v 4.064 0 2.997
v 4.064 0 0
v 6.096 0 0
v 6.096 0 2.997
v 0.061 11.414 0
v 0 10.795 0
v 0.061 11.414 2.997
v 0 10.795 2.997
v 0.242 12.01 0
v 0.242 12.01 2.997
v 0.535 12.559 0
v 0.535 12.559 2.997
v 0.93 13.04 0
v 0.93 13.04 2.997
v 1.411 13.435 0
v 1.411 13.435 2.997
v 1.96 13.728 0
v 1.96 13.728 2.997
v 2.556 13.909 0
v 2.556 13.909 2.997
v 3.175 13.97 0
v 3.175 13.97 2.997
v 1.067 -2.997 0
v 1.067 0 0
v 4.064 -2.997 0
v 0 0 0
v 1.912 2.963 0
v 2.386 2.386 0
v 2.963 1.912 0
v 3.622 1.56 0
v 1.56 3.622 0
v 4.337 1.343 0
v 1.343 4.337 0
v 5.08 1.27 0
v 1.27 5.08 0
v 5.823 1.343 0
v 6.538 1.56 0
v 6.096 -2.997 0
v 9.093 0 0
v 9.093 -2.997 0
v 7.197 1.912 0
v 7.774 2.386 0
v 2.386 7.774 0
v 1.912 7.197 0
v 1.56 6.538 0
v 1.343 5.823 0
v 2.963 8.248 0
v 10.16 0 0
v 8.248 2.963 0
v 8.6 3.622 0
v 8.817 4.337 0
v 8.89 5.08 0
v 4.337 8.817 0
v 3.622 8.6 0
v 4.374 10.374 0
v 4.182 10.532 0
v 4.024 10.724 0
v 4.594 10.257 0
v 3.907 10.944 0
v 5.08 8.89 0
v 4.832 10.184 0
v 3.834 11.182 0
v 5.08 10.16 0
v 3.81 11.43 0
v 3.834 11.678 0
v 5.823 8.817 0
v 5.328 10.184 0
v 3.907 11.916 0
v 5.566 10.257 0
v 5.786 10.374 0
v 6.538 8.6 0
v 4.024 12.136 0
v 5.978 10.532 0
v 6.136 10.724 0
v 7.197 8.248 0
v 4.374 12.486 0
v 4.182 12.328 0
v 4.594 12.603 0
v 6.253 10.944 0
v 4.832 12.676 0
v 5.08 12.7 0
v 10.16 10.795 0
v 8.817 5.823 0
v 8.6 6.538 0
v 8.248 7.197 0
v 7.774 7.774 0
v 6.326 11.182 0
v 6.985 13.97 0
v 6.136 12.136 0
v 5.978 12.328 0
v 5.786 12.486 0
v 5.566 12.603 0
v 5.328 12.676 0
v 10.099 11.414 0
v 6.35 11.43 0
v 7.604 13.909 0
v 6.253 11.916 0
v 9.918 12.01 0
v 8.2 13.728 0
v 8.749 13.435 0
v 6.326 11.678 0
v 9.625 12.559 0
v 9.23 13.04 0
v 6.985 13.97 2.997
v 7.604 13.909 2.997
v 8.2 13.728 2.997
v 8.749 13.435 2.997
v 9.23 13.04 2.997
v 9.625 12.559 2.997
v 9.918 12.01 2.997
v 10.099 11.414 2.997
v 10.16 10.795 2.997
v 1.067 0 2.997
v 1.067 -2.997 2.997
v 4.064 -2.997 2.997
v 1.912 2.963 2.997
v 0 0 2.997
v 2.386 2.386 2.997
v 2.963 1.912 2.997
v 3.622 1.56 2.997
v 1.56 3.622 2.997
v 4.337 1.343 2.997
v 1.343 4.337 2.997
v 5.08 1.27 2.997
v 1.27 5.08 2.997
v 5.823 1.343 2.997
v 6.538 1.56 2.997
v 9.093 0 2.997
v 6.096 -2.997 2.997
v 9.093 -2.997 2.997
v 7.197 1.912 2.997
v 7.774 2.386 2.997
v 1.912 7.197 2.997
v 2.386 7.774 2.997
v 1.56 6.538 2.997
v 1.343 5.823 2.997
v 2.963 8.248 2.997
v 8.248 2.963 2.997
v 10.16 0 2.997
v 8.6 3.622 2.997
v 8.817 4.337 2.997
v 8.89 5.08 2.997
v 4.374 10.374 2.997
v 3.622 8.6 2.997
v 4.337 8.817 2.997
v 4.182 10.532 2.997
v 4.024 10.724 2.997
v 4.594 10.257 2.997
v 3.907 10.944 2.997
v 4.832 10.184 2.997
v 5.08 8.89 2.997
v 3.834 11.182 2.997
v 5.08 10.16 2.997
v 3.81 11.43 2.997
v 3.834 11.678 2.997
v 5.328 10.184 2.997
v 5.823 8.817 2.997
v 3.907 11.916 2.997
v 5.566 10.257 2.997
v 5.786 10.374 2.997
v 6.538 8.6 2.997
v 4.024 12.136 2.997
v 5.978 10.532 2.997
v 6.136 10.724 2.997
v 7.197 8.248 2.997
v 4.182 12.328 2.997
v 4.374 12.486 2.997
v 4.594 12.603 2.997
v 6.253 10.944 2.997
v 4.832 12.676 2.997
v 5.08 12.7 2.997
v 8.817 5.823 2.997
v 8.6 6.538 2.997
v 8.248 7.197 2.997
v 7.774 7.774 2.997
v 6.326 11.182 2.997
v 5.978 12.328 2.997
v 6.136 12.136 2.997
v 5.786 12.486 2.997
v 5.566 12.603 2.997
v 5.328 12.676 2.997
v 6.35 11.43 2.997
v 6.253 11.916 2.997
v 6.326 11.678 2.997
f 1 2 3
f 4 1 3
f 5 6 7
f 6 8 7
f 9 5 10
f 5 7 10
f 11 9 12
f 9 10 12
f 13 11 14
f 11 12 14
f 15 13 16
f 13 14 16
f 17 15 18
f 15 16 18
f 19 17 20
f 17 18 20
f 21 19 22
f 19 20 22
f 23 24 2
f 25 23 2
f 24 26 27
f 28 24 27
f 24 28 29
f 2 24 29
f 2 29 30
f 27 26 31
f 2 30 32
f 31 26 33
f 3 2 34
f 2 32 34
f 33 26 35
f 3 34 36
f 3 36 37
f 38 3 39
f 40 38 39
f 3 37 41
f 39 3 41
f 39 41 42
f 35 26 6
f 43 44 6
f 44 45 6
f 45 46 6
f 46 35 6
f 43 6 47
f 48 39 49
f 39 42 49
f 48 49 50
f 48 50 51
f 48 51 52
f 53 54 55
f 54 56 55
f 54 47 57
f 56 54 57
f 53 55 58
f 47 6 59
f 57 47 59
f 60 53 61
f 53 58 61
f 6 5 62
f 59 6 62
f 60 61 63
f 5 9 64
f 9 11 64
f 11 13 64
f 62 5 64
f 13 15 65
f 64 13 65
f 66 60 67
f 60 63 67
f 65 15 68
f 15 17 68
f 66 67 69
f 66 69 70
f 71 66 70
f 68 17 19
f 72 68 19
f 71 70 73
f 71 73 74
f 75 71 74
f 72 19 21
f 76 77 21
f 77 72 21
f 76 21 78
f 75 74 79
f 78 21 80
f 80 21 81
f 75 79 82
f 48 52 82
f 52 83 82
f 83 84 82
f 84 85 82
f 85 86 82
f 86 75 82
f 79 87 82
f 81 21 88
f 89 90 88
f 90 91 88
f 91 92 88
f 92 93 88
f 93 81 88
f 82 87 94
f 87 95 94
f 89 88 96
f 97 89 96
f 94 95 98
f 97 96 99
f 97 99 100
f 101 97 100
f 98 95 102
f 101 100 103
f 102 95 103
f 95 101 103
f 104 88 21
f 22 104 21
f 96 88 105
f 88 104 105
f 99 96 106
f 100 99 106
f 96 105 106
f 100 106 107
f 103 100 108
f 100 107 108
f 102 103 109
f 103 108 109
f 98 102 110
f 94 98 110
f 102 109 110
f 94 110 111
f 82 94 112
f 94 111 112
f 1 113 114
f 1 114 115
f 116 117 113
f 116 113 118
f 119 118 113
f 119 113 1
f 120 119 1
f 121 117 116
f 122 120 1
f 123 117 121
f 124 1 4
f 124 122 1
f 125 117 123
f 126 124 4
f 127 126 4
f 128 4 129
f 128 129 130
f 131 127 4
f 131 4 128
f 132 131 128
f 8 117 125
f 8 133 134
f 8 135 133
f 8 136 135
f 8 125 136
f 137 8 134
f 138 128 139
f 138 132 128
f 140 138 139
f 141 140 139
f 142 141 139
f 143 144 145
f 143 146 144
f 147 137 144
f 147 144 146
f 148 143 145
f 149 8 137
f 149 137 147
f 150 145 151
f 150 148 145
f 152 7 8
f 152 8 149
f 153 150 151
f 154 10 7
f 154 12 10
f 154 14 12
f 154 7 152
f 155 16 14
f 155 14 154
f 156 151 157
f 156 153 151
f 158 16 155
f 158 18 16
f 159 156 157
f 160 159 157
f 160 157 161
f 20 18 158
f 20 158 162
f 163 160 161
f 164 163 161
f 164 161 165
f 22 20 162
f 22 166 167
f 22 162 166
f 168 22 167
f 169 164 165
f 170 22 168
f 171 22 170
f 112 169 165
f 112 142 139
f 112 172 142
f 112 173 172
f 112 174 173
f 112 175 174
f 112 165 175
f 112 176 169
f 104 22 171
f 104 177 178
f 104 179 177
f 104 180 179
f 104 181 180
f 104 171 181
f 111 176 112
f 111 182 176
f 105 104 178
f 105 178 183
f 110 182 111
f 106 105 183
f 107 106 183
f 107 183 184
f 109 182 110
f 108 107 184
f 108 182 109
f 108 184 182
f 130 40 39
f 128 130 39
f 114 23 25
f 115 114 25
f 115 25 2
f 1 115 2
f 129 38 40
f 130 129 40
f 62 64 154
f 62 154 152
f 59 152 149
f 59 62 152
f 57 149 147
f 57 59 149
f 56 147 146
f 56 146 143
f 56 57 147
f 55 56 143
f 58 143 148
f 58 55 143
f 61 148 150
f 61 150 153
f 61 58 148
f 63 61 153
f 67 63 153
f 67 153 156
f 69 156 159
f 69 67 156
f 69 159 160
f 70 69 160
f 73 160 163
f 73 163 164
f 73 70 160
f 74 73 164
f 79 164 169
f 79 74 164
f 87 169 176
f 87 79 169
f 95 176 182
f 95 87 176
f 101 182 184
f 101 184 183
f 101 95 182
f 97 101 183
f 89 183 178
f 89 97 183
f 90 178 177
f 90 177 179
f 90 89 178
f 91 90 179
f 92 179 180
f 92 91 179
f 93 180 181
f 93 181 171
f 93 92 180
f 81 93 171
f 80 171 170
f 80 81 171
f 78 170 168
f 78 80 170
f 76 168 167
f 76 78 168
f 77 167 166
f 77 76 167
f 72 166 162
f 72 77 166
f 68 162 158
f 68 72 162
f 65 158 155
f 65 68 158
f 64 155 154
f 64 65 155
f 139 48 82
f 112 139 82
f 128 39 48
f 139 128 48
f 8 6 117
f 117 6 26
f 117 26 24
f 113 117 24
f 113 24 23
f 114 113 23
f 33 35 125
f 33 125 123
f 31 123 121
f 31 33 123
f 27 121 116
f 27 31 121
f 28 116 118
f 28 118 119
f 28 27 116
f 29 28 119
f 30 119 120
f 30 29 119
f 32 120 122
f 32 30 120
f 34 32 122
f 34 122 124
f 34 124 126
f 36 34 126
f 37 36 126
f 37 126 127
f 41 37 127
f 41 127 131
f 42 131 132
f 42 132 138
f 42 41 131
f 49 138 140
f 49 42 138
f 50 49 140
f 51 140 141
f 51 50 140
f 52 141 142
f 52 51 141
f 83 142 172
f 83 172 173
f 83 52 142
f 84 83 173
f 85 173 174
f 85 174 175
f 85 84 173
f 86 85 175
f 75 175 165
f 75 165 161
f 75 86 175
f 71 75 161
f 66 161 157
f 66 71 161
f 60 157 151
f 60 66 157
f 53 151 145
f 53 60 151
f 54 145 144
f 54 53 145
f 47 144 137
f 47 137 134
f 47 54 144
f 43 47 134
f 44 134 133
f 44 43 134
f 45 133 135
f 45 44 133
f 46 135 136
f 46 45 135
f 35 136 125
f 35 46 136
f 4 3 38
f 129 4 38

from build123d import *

# Parameters (mm, degrees)
SKETCH1_R           = 3.81
SKETCH1_R_2         = 1.27
BOSS_EXTRUDE1_DEPTH = 2.9972
FILLET1_R           = 3.175


with BuildPart() as part:
    # Sketch1 → Boss-Extrude1 (new body)
    with BuildSketch(Plane.XY):
        Polygon((0, 0), (1.0668, 0), (1.0668, -2.9972), (4.064, -2.9972), (4.064, 0), (6.096, 0), (6.096, -2.9972), (9.0932, -2.9972), (9.0932, 0), (10.16, 0), (10.16, 13.97), (0, 13.97), align=None)
        with Locations(Location((5.08, 5.08, 0), (0, 0, 180))):
            Circle(SKETCH1_R, mode=Mode.SUBTRACT)
        with Locations(Location((5.08, 11.43, 0), (0, 0, 180))):
            Circle(SKETCH1_R_2, mode=Mode.SUBTRACT)
    extrude(amount=BOSS_EXTRUDE1_DEPTH)

    # Fillet1
    fillet1_edges = [part.edges().sort_by_distance(p)[0] for p in [
        (0, 13.97, 1.4986),
        (10.16, 13.97, 1.4986),
    ]]
    fillet(fillet1_edges, radius=FILLET1_R)


solid = part.part
